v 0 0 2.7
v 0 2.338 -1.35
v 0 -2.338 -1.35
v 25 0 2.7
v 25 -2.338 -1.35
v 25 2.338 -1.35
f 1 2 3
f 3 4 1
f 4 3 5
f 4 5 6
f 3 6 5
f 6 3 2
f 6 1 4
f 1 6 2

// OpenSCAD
triangulo_base();


module triangulo_base(){
  rotate([0, 90, 0]) {
    rotate(-30){
      triangle_tube(25, 5.4/2, 5.4/2);
    }
  }
}



//triangle_tube(20, 5, 5);
module triangle_tube(height,radius,wall)
{
   tubify(radius,wall) triangle_prism(height,radius);
}

//Tubifies any regular prism
module tubify(radius,wall)
{
  difference()
  {
    child(0);
    translate([0, 0, -0.1]) scale([(radius-wall)/radius, (radius-wall)/radius, 2]) child(0);
  }
}

module triangle_prism(height,radius)
{
  linear_extrude(height=height) triangle(radius);
}

module triangle(radius)
{
  o=radius/2;		//equivalent to radius*sin(30)
  a=radius*sqrt(3)/2;	//equivalent to radius*cos(30)
  polygon(points=[[-a,-o],[0,radius],[a,-o]],paths=[[0,1,2]]);
}
